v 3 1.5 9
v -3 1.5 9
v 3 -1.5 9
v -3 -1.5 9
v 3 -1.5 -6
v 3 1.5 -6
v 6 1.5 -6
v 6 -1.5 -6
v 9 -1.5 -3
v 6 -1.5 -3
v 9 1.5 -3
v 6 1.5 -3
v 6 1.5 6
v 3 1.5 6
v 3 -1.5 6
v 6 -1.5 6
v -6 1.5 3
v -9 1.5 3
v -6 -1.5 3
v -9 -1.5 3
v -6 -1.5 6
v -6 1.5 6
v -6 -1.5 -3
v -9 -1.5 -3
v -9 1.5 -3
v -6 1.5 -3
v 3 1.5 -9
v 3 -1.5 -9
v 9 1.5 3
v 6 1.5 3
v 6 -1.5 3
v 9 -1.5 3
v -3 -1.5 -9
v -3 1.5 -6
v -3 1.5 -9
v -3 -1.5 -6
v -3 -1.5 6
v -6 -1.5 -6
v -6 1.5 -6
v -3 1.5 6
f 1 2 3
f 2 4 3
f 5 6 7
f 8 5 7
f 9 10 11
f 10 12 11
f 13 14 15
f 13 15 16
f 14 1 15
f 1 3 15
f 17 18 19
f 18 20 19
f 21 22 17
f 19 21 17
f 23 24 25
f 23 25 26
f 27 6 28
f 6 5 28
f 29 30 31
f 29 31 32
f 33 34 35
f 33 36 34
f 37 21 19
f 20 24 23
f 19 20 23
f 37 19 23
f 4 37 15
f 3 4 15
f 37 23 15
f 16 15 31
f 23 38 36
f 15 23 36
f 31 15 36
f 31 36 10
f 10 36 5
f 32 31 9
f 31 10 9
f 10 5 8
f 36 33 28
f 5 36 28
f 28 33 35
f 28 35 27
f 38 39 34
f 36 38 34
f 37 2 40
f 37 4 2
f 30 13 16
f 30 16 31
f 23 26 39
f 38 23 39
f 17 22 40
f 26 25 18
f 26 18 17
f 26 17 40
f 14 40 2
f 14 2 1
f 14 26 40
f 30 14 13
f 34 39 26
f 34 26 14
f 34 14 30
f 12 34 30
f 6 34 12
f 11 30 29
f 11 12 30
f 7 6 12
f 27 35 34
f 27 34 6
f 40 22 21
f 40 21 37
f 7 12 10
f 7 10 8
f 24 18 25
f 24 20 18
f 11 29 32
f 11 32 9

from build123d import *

# Parameters (mm, degrees)
SKETCH1_W           = 12
SKETCH1_H           = 12
BOSS_EXTRUDE1_DEPTH = 1.5
SKETCH2_W           = 6
SKETCH2_H           = 3
SKETCH2_W_2         = 3
SKETCH2_H_2         = 6
BOSS_EXTRUDE2_DEPTH = 1.5


with BuildPart() as part:
    # Sketch1 → Boss-Extrude1 (new body, symmetric)
    with BuildSketch(Plane(origin=(0, 0, 0), x_dir=(1, 0, 0), z_dir=(0, 1, 0))):
        Rectangle(SKETCH1_W, SKETCH1_H)
    extrude(amount=BOSS_EXTRUDE1_DEPTH, both=True)

    # Sketch2 → Boss-Extrude2 (add, symmetric)
    with BuildSketch(Plane(origin=(0, 0, 0), x_dir=(1, 0, 0), z_dir=(0, 1, 0))):
        with Locations((0, 7.5)):
            Rectangle(SKETCH2_W, SKETCH2_H)
        with Locations((0, -7.5)):
            Rectangle(SKETCH2_W, SKETCH2_H)
        with Locations((-7.5, 0)):
            Rectangle(SKETCH2_W_2, SKETCH2_H_2)
        with Locations((7.5, 0)):
            Rectangle(SKETCH2_W_2, SKETCH2_H_2)
    extrude(amount=BOSS_EXTRUDE2_DEPTH, both=True)


solid = part.part
